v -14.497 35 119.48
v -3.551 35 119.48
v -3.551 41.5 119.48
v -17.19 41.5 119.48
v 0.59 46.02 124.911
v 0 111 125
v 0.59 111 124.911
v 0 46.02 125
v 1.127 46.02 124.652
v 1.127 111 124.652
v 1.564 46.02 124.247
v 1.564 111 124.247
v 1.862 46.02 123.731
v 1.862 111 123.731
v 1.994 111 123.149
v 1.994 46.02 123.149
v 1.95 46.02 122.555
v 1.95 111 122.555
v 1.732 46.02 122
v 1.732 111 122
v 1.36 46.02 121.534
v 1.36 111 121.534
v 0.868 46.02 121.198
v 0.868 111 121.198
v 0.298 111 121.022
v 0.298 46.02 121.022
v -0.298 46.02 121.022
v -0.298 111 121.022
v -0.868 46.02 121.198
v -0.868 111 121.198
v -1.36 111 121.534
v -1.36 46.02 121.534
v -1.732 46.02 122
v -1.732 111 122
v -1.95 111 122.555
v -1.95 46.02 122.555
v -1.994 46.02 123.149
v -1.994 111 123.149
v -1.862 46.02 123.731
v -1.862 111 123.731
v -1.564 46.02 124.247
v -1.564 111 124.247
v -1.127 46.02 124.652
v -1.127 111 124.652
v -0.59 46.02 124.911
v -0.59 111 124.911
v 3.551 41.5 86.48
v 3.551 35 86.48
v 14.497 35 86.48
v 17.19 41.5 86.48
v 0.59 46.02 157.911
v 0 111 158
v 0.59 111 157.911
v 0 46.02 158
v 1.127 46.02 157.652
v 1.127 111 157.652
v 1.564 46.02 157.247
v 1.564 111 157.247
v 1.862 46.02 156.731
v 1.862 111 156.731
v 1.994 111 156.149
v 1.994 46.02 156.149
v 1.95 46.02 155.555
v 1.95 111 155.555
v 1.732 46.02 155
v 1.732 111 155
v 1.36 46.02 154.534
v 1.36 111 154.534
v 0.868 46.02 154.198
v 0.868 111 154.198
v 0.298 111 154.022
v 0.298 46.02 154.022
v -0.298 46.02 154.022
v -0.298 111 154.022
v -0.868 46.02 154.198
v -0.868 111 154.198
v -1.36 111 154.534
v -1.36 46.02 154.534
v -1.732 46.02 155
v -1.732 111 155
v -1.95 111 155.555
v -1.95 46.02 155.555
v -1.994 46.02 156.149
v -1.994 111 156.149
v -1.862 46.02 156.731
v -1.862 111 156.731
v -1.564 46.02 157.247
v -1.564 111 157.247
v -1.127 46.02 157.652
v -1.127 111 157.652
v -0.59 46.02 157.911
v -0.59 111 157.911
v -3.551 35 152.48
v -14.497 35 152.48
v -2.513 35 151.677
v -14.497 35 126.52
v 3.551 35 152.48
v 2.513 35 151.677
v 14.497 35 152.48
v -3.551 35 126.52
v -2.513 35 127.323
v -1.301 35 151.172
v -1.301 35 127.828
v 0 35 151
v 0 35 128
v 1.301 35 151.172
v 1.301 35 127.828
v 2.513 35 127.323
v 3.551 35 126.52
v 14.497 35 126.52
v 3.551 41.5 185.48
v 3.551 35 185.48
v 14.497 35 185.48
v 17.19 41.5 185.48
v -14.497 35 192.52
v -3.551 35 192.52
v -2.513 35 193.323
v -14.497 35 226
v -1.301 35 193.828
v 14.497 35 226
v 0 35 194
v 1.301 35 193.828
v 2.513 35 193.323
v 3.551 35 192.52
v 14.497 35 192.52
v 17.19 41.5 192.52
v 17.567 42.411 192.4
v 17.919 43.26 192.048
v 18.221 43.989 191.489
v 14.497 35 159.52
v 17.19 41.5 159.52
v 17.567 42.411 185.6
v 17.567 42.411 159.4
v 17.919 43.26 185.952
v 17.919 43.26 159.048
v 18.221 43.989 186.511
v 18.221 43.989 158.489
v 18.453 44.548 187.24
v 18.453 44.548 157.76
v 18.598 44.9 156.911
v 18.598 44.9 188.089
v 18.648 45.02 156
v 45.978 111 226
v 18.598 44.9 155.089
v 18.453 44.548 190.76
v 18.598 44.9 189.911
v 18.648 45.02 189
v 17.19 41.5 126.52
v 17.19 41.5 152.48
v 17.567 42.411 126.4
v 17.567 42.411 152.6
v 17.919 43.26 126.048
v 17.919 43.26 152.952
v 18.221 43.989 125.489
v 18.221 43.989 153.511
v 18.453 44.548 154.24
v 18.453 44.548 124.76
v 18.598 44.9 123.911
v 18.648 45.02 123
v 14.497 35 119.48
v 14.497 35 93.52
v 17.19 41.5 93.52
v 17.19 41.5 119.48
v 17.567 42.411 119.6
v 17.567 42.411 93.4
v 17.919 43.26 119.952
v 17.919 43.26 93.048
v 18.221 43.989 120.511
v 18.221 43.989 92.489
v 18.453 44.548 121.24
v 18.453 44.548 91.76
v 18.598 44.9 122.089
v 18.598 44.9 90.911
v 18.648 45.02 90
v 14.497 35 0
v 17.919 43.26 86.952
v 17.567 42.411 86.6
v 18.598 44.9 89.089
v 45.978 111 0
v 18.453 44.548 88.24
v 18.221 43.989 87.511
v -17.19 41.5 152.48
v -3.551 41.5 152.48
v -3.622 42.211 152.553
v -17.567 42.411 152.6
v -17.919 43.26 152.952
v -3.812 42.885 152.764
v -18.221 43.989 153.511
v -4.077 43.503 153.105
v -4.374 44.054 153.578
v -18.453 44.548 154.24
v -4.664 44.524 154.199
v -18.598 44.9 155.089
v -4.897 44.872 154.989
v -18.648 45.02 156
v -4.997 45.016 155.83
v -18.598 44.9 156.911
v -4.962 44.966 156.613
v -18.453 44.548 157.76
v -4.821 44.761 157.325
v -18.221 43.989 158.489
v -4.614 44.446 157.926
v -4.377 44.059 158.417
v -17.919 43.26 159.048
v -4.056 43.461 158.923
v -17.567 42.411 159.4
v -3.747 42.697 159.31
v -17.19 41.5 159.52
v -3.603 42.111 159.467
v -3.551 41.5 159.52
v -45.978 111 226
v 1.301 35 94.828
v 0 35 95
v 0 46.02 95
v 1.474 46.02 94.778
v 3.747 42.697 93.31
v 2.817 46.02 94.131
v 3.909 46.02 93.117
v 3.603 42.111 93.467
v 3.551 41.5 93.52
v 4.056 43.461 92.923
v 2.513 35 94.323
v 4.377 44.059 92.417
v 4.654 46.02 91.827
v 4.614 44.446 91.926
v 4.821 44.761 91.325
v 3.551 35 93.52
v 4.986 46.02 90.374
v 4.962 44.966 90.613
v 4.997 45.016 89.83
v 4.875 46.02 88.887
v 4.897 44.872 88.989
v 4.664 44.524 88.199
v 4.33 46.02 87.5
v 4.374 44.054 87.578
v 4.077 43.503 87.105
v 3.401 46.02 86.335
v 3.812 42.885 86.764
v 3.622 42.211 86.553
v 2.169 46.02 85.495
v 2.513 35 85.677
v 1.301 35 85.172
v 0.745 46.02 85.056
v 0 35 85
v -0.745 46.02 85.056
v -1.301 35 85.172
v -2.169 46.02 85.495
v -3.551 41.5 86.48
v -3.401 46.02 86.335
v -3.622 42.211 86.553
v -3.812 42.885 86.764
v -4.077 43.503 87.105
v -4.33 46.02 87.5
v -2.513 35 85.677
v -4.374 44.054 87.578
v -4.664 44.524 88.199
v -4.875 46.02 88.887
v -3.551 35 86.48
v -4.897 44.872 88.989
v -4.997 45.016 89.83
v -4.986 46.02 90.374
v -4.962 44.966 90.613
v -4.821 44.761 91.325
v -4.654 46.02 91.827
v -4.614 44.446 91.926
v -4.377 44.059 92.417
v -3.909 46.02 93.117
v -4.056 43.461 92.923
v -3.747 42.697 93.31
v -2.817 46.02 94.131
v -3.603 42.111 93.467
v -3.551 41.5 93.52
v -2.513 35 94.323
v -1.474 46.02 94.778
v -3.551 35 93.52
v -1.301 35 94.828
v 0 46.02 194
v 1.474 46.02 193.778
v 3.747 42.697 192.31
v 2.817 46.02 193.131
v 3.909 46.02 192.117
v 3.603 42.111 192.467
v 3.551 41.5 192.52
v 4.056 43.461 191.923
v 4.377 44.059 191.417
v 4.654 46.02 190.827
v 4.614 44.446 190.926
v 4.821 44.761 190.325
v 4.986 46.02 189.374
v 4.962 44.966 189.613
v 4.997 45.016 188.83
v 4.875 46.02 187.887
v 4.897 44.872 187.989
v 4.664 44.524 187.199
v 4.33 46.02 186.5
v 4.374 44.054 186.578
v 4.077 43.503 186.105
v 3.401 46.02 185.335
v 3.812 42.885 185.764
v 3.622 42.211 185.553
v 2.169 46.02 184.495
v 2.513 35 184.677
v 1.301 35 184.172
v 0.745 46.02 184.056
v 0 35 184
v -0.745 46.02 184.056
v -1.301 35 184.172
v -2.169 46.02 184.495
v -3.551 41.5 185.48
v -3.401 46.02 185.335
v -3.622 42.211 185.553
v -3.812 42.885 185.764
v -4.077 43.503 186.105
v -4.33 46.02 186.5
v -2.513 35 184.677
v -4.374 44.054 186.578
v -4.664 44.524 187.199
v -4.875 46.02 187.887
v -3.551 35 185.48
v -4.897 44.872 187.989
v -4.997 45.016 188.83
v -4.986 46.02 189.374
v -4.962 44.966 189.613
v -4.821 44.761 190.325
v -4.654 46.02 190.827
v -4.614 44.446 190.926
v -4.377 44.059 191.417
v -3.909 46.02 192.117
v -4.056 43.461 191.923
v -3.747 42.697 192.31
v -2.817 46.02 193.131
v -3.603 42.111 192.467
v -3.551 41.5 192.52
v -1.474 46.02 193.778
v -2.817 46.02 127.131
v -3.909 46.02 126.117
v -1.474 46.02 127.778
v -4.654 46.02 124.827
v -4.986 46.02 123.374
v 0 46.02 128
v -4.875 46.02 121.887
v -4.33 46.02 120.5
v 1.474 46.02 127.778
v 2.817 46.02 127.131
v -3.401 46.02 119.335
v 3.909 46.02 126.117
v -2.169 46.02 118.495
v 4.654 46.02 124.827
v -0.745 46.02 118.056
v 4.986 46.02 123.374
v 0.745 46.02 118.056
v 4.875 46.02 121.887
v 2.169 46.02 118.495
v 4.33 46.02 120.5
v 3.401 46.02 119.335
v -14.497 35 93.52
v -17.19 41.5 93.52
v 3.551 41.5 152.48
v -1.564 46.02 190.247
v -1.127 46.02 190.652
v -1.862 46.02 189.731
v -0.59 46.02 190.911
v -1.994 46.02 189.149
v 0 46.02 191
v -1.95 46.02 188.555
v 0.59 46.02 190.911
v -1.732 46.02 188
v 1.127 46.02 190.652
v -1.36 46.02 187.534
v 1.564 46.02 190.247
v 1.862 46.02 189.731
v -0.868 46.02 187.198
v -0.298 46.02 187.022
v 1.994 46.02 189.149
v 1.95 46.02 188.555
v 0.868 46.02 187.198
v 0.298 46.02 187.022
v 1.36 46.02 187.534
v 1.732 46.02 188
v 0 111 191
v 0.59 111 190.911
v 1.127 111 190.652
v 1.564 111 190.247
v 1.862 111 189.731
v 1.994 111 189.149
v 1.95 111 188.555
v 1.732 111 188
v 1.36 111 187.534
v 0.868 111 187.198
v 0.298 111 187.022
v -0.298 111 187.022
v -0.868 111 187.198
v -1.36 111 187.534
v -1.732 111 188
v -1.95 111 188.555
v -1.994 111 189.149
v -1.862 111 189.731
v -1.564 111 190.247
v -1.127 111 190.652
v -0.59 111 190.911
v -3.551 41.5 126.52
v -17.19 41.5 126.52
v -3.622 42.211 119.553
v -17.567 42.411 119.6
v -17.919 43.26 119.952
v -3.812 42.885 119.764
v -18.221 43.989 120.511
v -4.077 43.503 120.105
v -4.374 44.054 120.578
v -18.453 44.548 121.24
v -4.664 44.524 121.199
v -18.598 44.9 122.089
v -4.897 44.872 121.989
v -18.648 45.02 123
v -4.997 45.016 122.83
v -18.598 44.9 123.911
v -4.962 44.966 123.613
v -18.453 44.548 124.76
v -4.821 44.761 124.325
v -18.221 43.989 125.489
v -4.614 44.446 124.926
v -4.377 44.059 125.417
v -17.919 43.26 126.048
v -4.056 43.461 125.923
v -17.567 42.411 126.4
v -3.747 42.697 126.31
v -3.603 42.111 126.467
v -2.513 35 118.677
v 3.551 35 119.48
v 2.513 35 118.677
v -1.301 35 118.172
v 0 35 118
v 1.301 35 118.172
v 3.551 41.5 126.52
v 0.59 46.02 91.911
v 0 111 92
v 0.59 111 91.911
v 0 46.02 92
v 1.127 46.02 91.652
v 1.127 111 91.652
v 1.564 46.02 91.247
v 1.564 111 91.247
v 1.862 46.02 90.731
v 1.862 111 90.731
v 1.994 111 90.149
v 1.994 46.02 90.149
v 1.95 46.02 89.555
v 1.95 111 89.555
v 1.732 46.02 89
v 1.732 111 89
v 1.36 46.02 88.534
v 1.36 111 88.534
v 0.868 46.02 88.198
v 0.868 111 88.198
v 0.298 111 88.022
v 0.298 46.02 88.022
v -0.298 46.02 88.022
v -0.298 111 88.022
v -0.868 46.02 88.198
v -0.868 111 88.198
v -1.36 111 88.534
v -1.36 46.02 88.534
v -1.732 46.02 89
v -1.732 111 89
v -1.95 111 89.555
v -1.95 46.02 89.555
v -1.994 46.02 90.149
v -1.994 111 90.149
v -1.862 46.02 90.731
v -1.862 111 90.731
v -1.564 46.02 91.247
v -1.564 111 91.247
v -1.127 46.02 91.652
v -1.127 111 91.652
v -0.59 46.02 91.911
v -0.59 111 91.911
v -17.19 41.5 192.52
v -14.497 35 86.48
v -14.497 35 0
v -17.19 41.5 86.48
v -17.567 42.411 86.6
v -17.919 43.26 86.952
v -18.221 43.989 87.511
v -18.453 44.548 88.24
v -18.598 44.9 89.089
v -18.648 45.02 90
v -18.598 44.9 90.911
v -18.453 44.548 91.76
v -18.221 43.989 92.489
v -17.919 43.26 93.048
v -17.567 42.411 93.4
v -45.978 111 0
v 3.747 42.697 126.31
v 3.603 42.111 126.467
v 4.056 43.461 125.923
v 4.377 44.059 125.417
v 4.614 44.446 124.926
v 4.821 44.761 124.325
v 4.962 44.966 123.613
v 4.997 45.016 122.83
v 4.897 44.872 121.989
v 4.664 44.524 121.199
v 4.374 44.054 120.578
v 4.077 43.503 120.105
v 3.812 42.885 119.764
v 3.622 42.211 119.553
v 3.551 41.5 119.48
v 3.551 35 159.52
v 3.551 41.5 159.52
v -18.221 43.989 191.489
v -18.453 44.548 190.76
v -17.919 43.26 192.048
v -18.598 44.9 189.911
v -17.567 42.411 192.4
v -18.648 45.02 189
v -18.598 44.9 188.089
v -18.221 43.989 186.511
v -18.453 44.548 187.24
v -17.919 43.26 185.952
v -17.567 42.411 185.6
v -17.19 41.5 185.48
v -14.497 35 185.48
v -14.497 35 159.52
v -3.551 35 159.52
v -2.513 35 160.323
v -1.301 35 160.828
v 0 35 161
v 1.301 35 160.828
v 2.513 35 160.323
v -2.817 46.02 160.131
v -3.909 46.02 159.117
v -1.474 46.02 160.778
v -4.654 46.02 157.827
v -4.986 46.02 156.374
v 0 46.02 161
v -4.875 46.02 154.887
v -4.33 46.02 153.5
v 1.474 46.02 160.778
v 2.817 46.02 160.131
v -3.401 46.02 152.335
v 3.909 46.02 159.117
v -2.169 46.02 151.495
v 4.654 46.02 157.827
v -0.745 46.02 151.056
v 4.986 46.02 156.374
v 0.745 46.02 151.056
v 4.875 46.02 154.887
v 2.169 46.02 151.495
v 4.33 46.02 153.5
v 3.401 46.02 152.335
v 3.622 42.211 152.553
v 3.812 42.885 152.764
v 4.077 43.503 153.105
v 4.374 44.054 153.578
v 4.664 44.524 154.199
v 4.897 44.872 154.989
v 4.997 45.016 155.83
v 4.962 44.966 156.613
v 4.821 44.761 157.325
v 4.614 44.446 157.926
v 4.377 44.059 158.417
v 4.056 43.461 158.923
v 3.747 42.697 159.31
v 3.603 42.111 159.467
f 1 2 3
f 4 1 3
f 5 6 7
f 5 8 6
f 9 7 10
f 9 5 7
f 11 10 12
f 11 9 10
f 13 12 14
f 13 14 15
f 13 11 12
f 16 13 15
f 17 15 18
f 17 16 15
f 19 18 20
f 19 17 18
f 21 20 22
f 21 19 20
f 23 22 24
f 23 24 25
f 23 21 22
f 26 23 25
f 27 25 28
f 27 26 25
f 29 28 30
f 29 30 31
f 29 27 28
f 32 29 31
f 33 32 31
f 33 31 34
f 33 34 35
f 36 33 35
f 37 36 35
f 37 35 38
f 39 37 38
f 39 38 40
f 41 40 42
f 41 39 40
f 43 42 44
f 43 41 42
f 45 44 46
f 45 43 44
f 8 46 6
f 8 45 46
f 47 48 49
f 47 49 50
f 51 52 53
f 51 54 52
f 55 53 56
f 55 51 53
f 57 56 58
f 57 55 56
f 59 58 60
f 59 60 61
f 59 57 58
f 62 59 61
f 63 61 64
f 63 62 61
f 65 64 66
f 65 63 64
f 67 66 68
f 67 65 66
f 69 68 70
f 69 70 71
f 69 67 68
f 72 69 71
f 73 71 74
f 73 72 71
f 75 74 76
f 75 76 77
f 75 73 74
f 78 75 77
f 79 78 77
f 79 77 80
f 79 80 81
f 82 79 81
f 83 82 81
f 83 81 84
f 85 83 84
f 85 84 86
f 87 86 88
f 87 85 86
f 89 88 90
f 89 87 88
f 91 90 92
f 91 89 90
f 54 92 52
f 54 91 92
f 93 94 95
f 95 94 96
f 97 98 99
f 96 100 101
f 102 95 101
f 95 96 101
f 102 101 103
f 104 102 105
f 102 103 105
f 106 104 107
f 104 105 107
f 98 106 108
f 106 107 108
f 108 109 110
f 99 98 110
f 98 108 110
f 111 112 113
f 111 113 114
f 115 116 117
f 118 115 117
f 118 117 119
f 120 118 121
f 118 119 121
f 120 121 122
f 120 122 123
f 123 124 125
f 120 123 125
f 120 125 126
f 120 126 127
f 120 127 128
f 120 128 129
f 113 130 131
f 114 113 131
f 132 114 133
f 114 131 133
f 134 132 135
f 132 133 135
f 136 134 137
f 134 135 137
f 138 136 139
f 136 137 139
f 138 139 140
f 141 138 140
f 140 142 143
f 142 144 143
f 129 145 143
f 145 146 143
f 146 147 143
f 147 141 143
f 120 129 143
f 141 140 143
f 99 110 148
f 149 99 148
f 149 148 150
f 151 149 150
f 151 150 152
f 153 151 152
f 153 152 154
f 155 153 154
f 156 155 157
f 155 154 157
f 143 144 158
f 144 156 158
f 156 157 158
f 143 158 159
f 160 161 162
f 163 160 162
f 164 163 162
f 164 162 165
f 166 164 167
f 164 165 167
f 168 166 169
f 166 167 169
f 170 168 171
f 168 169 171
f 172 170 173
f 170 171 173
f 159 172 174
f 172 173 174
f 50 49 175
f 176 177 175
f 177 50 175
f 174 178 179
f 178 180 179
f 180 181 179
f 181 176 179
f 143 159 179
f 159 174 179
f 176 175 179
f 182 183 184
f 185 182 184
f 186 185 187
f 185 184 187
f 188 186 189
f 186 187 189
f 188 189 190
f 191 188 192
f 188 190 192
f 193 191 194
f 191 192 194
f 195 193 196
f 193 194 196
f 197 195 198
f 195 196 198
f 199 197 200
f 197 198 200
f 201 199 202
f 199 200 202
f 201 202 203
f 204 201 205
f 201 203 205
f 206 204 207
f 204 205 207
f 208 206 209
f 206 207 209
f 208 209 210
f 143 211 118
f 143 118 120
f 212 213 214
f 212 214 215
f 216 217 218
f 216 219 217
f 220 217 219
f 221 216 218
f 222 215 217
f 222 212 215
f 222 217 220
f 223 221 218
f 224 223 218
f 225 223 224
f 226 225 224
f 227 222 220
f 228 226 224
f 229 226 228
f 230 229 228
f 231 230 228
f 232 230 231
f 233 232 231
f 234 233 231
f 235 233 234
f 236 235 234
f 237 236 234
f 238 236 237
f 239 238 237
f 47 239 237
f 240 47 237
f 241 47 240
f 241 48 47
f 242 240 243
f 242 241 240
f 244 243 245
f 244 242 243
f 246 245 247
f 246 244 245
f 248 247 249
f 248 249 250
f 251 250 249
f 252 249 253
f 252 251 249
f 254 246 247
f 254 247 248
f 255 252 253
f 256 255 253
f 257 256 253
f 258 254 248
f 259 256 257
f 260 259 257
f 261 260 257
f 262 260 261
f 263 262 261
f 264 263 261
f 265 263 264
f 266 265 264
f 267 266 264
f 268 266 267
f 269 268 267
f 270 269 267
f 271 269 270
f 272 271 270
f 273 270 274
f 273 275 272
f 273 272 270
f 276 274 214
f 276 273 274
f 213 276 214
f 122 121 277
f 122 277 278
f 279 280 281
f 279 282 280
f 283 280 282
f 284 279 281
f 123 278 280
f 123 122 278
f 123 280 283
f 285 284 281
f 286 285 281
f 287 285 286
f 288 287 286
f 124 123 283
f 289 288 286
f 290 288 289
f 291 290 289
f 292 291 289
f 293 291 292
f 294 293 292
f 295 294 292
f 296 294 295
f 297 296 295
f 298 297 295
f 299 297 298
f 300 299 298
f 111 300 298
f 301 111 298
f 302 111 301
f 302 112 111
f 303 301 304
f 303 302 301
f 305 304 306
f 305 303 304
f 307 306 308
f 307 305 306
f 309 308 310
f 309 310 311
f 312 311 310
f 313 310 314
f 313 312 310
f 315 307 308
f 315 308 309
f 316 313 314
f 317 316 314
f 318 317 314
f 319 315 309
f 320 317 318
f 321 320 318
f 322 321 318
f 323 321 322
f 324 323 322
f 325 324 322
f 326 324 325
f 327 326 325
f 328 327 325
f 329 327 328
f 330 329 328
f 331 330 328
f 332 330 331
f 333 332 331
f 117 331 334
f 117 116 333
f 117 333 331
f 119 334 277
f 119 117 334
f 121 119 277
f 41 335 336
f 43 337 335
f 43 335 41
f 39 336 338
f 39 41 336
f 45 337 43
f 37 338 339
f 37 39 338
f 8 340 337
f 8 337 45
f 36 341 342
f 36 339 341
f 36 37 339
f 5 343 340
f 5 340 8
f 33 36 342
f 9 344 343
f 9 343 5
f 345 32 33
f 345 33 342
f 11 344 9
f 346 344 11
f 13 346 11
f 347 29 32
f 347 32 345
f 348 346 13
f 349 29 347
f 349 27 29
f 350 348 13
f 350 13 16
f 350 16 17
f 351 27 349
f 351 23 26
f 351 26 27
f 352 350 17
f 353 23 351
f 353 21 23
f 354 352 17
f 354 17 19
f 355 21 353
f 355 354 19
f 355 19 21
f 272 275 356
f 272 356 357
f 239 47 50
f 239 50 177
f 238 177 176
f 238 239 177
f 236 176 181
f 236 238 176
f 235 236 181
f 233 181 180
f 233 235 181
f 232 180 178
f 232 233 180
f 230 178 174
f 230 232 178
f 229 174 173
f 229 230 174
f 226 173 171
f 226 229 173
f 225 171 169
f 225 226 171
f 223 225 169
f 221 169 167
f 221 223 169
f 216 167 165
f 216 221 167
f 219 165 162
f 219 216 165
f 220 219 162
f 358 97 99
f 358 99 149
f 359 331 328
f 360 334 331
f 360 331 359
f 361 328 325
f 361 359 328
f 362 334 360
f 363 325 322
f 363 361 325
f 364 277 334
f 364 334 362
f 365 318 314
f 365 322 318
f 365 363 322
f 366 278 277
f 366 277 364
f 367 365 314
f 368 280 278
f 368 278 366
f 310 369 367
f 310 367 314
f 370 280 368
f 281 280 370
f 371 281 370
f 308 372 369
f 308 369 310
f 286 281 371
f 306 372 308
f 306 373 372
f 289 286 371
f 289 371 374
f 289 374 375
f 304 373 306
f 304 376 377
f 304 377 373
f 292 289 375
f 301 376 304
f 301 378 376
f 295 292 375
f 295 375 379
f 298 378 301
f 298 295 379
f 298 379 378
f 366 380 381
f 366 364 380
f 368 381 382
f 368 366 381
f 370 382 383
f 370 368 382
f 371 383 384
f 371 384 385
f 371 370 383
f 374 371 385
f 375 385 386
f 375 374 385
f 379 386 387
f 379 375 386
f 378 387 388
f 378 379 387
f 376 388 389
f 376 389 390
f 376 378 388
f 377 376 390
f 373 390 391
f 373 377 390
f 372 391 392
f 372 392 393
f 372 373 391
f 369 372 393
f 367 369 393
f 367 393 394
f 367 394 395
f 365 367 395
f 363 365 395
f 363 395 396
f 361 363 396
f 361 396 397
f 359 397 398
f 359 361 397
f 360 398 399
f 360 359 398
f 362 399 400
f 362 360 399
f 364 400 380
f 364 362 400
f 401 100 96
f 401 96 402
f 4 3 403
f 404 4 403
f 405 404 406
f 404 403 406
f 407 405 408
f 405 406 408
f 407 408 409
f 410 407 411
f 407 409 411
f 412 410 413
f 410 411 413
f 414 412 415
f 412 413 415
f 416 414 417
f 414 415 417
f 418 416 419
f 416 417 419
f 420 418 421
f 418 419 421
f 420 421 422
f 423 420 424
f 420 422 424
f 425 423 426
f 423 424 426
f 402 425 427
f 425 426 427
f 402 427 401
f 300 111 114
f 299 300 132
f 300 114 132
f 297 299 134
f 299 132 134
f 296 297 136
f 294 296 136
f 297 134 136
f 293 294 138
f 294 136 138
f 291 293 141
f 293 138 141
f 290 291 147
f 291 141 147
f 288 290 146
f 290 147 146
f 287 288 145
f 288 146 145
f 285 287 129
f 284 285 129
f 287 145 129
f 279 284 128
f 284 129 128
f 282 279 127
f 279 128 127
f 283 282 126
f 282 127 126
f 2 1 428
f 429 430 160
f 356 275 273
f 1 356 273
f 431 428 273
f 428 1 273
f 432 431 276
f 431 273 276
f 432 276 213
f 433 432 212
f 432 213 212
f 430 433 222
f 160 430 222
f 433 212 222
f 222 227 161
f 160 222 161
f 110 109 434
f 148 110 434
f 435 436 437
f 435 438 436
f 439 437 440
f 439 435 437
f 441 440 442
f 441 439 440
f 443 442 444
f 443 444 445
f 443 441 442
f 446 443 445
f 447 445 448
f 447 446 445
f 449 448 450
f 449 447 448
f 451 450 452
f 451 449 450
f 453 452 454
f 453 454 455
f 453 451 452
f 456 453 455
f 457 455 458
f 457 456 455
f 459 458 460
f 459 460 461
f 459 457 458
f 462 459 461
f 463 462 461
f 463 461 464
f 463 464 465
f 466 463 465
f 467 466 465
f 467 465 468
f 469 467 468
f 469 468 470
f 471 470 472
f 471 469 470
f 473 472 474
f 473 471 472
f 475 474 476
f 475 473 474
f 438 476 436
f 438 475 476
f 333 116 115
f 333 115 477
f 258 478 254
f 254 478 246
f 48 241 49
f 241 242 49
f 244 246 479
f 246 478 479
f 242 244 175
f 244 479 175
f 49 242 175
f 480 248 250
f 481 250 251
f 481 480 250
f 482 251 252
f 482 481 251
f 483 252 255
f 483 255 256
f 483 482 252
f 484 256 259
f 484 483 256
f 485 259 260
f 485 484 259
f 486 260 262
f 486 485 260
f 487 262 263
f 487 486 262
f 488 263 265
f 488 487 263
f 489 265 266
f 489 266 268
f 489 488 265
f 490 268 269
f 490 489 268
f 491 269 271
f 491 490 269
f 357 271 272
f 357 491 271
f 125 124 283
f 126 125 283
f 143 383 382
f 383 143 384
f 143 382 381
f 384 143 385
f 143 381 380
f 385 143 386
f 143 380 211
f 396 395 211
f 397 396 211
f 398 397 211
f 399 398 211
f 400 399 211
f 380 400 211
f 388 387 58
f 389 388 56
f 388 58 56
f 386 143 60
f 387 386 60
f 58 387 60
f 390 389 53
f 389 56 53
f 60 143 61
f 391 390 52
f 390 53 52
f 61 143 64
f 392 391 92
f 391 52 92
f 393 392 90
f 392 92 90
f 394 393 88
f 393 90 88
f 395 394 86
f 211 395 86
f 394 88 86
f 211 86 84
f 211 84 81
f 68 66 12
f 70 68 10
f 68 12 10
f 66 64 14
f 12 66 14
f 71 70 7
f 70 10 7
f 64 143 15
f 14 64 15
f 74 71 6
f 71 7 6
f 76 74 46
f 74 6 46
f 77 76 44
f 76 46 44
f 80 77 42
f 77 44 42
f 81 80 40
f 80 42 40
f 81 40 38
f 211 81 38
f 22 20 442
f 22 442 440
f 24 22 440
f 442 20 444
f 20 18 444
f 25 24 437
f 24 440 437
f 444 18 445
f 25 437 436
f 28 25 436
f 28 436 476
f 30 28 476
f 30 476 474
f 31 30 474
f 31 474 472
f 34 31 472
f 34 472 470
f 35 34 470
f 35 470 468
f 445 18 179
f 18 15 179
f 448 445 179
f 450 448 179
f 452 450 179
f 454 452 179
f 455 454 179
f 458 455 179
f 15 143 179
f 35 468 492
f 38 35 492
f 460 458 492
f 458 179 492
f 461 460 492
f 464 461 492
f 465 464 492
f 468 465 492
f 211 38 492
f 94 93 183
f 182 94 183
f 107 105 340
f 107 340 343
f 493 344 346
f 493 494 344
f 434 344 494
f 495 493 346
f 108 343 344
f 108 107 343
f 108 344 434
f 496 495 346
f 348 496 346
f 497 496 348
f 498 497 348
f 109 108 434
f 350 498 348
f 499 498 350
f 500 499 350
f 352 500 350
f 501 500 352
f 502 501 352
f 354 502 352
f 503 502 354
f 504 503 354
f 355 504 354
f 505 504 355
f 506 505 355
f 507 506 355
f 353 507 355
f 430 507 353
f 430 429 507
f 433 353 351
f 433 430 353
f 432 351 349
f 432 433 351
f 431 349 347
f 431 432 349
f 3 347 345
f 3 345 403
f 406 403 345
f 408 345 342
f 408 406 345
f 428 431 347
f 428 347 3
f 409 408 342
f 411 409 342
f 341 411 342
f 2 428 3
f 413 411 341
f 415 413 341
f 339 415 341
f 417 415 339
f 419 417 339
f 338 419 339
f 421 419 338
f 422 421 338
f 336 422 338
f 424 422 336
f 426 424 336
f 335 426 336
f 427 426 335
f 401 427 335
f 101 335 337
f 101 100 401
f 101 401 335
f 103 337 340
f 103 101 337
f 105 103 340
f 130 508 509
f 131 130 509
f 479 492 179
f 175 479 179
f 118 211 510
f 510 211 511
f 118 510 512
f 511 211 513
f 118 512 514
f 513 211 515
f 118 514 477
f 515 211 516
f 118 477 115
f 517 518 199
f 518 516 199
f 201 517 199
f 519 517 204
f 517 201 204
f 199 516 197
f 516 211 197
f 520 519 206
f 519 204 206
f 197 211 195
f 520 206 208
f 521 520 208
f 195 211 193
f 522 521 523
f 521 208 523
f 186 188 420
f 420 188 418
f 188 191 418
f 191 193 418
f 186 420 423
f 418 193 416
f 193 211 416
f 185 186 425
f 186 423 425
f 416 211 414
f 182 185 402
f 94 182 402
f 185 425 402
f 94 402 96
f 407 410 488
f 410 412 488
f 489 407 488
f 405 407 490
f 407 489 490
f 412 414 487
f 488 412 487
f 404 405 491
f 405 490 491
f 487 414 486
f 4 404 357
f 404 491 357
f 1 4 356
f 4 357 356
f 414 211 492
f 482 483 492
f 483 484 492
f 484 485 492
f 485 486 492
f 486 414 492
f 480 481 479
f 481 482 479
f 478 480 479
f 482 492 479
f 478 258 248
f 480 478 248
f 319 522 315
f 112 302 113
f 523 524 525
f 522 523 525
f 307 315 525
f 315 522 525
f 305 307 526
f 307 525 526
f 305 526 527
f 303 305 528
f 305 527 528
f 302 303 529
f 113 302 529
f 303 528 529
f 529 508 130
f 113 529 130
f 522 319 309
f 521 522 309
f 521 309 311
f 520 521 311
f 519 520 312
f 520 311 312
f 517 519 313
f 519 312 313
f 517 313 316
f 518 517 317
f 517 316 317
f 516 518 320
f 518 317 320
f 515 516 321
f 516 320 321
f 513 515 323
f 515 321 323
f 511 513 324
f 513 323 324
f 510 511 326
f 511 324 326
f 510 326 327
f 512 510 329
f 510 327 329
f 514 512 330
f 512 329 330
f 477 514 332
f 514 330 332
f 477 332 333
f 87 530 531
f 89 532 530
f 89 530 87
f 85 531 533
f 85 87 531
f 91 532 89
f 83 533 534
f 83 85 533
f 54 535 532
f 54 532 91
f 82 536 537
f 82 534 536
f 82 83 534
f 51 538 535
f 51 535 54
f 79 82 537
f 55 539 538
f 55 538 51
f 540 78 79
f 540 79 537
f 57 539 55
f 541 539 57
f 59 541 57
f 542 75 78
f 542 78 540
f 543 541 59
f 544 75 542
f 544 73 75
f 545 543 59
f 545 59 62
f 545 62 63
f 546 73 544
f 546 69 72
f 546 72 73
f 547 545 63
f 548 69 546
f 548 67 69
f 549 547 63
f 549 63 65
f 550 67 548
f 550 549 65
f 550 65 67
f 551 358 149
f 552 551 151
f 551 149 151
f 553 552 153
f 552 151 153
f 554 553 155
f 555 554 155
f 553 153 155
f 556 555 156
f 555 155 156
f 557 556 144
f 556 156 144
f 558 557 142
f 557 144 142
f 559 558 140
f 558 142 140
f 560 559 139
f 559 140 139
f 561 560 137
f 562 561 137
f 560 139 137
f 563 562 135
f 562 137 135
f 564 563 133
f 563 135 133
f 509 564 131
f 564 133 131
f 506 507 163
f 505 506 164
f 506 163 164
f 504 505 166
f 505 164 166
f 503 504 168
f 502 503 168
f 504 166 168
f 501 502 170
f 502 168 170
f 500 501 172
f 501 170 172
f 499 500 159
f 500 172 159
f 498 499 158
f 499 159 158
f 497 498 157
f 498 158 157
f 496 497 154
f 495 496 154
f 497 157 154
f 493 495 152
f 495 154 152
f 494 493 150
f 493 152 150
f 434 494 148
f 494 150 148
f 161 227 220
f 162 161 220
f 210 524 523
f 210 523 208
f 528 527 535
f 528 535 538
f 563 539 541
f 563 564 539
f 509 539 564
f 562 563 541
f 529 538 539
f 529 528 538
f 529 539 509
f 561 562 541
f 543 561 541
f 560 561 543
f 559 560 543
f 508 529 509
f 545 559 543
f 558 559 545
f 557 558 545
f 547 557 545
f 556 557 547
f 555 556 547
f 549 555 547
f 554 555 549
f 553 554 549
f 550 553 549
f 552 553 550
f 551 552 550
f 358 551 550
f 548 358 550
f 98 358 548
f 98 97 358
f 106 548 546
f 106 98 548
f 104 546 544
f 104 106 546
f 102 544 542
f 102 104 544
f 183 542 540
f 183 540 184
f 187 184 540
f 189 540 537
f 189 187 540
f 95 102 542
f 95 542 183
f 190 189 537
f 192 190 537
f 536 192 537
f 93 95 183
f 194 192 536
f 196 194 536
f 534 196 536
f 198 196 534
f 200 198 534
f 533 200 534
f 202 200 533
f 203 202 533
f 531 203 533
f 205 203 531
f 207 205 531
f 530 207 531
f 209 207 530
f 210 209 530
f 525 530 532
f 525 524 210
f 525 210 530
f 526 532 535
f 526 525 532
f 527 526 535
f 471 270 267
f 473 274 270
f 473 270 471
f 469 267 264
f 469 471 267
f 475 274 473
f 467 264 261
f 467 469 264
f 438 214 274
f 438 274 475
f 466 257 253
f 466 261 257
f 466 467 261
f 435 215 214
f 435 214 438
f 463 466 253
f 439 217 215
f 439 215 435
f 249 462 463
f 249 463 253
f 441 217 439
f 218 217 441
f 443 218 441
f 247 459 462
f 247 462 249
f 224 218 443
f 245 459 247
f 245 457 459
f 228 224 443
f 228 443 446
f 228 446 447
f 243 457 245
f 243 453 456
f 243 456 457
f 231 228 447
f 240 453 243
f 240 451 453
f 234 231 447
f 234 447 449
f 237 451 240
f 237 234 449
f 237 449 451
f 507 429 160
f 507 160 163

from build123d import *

# Parameters (mm, degrees)
PAD_DEPTH              = 226
POCKET_DEPTH           = 45.978705
POCKET_DEPTH_BACK      = 45.978705
LINEARPATTERN_COUNT    = 4
LINEARPATTERN_PITCH    = 33
LINEARPATTERN001_COUNT = 4
LINEARPATTERN001_PITCH = 33


with BuildPart() as part:
    # Sketch → Pad (new body)
    with BuildSketch(Plane.XY):
        Polygon((45.977705, 111), (-45.977705, 111), (-14.497475, 35), (14.497475, 35), align=None)
    extrude(amount=PAD_DEPTH)

    # Sketch001 → Pocket (cut, two sides)
    with BuildSketch(Plane.YZ) as pocket_sk:
        with BuildLine():
            ThreePointArc((0, 93.52), (-3.52, 90), (0, 86.48))
            Line((0, 86.48), (41.5, 86.48))
            ThreePointArc((41.5, 86.48), (45.02, 90), (41.5, 93.52))
            Line((0, 93.52), (41.5, 93.52))
        make_face()
    pocket = extrude(amount=-POCKET_DEPTH, mode=Mode.SUBTRACT) + extrude(pocket_sk.sketch, amount=POCKET_DEPTH_BACK, mode=Mode.SUBTRACT)

    # LinearPattern: Pocket ×4
    with Locations(*[(0, 0, i * LINEARPATTERN_PITCH) for i in range(1, LINEARPATTERN_COUNT)]):
        add(pocket, mode=Mode.SUBTRACT)

    # Sketch002 → Groove (revolve, cut)
    with BuildSketch(Plane.YZ):
        Polygon((35, 90), (111, 90), (111, 92), (46.02, 92), (46.02, 95), (35, 95), align=None)
    groove = revolve(axis=Axis((0, 35, 90), (0, 1, 0)), mode=Mode.SUBTRACT)

    # LinearPattern001: Groove ×4
    with Locations(*[(0, 0, i * LINEARPATTERN001_PITCH) for i in range(1, LINEARPATTERN001_COUNT)]):
        add(groove, mode=Mode.SUBTRACT)


solid = part.part
